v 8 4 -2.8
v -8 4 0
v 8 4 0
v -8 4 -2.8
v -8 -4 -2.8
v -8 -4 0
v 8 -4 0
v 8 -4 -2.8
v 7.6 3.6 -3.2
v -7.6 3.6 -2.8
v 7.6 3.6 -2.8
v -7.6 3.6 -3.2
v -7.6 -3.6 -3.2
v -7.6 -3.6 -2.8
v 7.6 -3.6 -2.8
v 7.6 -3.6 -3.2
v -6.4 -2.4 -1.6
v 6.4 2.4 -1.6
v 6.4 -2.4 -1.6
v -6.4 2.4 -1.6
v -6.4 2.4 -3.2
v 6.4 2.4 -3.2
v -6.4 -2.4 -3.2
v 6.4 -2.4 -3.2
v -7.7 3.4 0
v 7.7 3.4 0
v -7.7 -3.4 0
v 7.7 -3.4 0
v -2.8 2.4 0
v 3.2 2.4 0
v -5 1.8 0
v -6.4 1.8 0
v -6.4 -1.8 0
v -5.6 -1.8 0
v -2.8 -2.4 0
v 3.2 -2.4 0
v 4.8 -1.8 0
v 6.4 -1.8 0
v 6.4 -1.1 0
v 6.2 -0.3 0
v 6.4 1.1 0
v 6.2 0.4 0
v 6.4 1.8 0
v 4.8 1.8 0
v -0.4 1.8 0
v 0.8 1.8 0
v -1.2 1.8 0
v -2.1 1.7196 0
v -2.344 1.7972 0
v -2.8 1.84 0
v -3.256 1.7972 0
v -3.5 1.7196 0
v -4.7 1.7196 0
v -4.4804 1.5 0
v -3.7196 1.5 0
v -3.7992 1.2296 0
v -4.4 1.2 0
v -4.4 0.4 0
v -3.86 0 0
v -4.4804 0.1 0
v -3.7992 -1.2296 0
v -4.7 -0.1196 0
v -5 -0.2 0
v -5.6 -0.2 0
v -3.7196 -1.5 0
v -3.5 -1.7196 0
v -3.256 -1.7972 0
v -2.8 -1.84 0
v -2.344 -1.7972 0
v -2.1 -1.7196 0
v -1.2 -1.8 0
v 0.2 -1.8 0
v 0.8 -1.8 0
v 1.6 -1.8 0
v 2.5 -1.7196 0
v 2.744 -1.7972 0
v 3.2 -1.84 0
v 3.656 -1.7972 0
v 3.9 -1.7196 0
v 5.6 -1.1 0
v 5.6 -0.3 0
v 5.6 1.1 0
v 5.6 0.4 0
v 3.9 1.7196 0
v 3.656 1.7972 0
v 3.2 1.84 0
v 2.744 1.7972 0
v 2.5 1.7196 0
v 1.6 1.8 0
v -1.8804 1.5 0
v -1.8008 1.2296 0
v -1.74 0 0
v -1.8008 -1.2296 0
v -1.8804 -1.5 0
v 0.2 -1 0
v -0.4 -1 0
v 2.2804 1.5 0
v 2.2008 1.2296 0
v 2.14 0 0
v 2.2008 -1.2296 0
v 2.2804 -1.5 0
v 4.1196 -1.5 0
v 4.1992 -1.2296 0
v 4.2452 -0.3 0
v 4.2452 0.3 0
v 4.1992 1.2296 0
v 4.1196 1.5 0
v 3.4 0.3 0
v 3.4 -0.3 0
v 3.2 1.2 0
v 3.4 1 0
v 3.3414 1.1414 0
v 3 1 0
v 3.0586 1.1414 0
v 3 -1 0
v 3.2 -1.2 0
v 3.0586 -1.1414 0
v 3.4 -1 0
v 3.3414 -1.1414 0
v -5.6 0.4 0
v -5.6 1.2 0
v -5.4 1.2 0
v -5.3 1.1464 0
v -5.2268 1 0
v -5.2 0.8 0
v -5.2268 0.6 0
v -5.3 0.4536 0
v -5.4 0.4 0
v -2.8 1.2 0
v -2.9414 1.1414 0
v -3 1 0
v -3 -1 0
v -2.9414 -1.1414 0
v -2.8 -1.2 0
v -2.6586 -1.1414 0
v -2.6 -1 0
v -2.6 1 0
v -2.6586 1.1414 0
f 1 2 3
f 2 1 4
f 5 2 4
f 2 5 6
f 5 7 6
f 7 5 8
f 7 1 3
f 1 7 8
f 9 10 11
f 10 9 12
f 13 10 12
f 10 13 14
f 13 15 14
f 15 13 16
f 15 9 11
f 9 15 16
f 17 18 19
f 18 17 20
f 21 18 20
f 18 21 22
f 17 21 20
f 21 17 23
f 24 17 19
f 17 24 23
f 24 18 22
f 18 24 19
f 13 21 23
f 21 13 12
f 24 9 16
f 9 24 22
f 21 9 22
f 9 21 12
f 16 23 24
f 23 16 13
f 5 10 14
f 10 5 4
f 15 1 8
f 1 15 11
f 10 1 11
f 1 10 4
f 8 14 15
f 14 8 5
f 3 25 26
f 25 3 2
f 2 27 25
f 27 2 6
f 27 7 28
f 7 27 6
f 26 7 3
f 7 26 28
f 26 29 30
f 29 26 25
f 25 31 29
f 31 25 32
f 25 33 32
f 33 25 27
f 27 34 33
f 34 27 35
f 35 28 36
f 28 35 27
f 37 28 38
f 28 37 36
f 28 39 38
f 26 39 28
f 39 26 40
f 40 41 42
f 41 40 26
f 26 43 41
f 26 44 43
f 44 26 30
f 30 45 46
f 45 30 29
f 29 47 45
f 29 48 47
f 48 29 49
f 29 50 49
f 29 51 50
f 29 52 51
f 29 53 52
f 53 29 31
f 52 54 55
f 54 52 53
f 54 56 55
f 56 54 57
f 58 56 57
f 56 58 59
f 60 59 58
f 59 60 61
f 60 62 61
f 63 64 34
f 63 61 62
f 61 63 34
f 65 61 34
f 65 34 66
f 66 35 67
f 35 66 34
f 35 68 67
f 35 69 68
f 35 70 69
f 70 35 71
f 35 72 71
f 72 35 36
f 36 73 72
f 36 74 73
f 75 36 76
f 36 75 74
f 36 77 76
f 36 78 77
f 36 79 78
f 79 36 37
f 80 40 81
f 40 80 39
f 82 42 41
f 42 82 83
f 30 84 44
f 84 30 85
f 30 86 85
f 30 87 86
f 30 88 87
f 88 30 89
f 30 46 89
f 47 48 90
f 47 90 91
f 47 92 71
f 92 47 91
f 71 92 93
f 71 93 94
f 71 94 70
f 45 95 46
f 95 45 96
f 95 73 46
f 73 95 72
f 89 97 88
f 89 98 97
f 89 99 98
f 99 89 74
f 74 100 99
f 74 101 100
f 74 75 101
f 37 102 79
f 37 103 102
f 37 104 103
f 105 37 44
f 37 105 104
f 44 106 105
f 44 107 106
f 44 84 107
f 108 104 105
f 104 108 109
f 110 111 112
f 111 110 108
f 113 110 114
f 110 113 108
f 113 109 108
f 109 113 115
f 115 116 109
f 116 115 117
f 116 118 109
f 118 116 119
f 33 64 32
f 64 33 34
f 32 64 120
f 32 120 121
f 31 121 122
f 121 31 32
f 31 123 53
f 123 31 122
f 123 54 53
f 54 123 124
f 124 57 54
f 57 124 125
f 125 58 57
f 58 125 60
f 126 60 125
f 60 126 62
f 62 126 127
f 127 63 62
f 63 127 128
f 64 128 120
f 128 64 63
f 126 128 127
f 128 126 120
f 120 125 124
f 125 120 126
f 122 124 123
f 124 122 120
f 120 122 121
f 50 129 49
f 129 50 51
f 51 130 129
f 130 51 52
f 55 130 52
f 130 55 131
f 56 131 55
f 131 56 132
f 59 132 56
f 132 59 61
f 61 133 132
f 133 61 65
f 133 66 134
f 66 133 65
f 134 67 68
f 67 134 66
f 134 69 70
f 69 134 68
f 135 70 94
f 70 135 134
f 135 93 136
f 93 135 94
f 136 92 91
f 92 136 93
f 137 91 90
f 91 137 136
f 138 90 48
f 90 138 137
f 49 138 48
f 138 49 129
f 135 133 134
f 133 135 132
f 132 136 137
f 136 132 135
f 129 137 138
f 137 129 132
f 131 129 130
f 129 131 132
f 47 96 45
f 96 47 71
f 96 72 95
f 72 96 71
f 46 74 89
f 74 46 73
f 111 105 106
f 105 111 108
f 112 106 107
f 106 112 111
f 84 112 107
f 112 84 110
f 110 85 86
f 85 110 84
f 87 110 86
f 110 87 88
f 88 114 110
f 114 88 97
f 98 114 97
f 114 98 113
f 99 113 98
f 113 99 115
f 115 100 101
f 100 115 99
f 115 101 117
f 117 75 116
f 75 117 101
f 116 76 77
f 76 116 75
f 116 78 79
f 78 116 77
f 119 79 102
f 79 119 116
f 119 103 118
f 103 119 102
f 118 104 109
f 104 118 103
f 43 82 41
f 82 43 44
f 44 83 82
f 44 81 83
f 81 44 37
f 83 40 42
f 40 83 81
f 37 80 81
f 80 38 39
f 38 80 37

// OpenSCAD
// file: ../p/box5.scad
use <../lib.scad>
function ldraw_lib__box5() = [
// 0 Box with 5 Faces and All Edges
// 0 Name: box5.dat
// 0 Author: James Jessiman
// 0 !LDRAW_ORG Primitive UPDATE 2012-01
// 0 !LICENSE Licensed under CC BY 4.0 : see CAreadme.txt
// 
// 0 BFC CERTIFY CCW
  [0,"BFC","CERTIFY"],
  [0,"BFC","CCW"],
// 
// 0 !HISTORY 2002-04-03 [sbliss] Modified for BFC compliance
// 0 !HISTORY 2002-04-25 [PTadmin] Official Update 2002-02
// 0 !HISTORY 2007-06-24 [PTadmin] Header formatted for Contributor Agreement
// 0 !HISTORY 2008-07-01 [PTadmin] Official Update 2008-01
// 0 !HISTORY 2012-02-16 [Philo] Changed to CCW
// 0 !HISTORY 2012-03-30 [PTadmin] Official Update 2012-01
// 
// 
// 2 24 1 1 1 -1 1 1
  [2,24,1,1,1,-1,1,1],
// 2 24 -1 1 1 -1 1 -1
  [2,24,-1,1,1,-1,1,-1],
// 2 24 -1 1 -1 1 1 -1
  [2,24,-1,1,-1,1,1,-1],
// 2 24 1 1 -1 1 1 1
  [2,24,1,1,-1,1,1,1],
// 2 24 1 0 1 -1 0 1
  [2,24,1,0,1,-1,0,1],
// 2 24 -1 0 1 -1 0 -1
  [2,24,-1,0,1,-1,0,-1],
// 2 24 -1 0 -1 1 0 -1
  [2,24,-1,0,-1,1,0,-1],
// 2 24 1 0 -1 1 0 1
  [2,24,1,0,-1,1,0,1],
// 2 24 1 0 1 1 1 1
  [2,24,1,0,1,1,1,1],
// 2 24 -1 0 1 -1 1 1
  [2,24,-1,0,1,-1,1,1],
// 2 24 1 0 -1 1 1 -1
  [2,24,1,0,-1,1,1,-1],
// 2 24 -1 0 -1 -1 1 -1
  [2,24,-1,0,-1,-1,1,-1],
// 4 16 -1 1 1 1 1 1 1 1 -1 -1 1 -1
  [4,16,-1,1,1,1,1,1,1,1,-1,-1,1,-1],
// 4 16 -1 1 1 -1 0 1 1 0 1 1 1 1
  [4,16,-1,1,1,-1,0,1,1,0,1,1,1,1],
// 4 16 -1 1 -1 -1 0 -1 -1 0 1 -1 1 1
  [4,16,-1,1,-1,-1,0,-1,-1,0,1,-1,1,1],
// 4 16 1 1 -1 1 0 -1 -1 0 -1 -1 1 -1
  [4,16,1,1,-1,1,0,-1,-1,0,-1,-1,1,-1],
// 4 16 1 1 1 1 0 1 1 0 -1 1 1 -1
  [4,16,1,1,1,1,0,1,1,0,-1,1,1,-1],
];
module ldraw_lib__box5(step=0, col=false, unit=2/5, alt=false, line=0.2, solid=!$preview)
    makepoly(ldraw_lib__box5(), step=step, col=col, unit=unit, alt=alt, line=line, solid=solid);
ldraw_lib__box5(line=0.2);
// file: ../p/box4.scad
use <../lib.scad>
function ldraw_lib__box4() = [
// 0 Box with 4 Faces (2 Parallel Pairs) and All Edges
// 0 Name: box4.dat
// 0 Author: James Jessiman
// 0 !LDRAW_ORG Primitive UPDATE 2012-01
// 0 !LICENSE Licensed under CC BY 4.0 : see CAreadme.txt
// 
// 0 BFC CERTIFY CCW
  [0,"BFC","CERTIFY"],
  [0,"BFC","CCW"],
// 
// 0 !HISTORY 2002-04-03 [sbliss] Modified for BFC compliance
// 0 !HISTORY 2002-04-25 [PTadmin] Official Update 2002-02
// 0 !HISTORY 2007-06-24 [PTadmin] Header formatted for Contributor Agreement
// 0 !HISTORY 2008-07-01 [PTadmin] Official Update 2008-01
// 0 !HISTORY 2012-02-16 [Philo] Changed to CCW
// 0 !HISTORY 2012-03-30 [PTadmin] Official Update 2012-01
// 
// 
// 2 24 1 1 1 -1 1 1
  [2,24,1,1,1,-1,1,1],
// 2 24 -1 1 1 -1 1 -1
  [2,24,-1,1,1,-1,1,-1],
// 2 24 -1 1 -1 1 1 -1
  [2,24,-1,1,-1,1,1,-1],
// 2 24 1 1 -1 1 1 1
  [2,24,1,1,-1,1,1,1],
// 2 24 1 0 1 -1 0 1
  [2,24,1,0,1,-1,0,1],
// 2 24 -1 0 1 -1 0 -1
  [2,24,-1,0,1,-1,0,-1],
// 2 24 -1 0 -1 1 0 -1
  [2,24,-1,0,-1,1,0,-1],
// 2 24 1 0 -1 1 0 1
  [2,24,1,0,-1,1,0,1],
// 2 24 1 0 1 1 1 1
  [2,24,1,0,1,1,1,1],
// 2 24 -1 0 1 -1 1 1
  [2,24,-1,0,1,-1,1,1],
// 2 24 1 0 -1 1 1 -1
  [2,24,1,0,-1,1,1,-1],
// 2 24 -1 0 -1 -1 1 -1
  [2,24,-1,0,-1,-1,1,-1],
// 4 16 -1 1 1 -1 0 1 1 0 1 1 1 1
  [4,16,-1,1,1,-1,0,1,1,0,1,1,1,1],
// 4 16 -1 1 -1 -1 0 -1 -1 0 1 -1 1 1
  [4,16,-1,1,-1,-1,0,-1,-1,0,1,-1,1,1],
// 4 16 1 1 -1 1 0 -1 -1 0 -1 -1 1 -1
  [4,16,1,1,-1,1,0,-1,-1,0,-1,-1,1,-1],
// 4 16 1 1 1 1 0 1 1 0 -1 1 1 -1
  [4,16,1,1,1,1,0,1,1,0,-1,1,1,-1],
];
module ldraw_lib__box4(step=0, col=false, unit=2/5, alt=false, line=0.2, solid=!$preview)
    makepoly(ldraw_lib__box4(), step=step, col=col, unit=unit, alt=alt, line=line, solid=solid);
ldraw_lib__box4(line=0.2);
// file: s/3069bs01.scad
use <../../lib.scad>
use <../../p/box4.scad>
use <../../p/box5.scad>
function ldraw_lib__s__3069bs01() = [
// 0 ~Tile  1 x  2 with Groove without Top Face
// 0 Name: s\3069bs01.dat
// 0 Author: Santeri Piippo [arezey]
// 0 !LDRAW_ORG Subpart UPDATE 2010-02
// 0 !LICENSE Licensed under CC BY 4.0 : see CAreadme.txt
// 
// 0 BFC CERTIFY CCW
  [0,"BFC","CERTIFY"],
  [0,"BFC","CCW"],
// 
// 0 !HISTORY 2010-07-05 [PTadmin] Official Update 2010-02
// 
// 
// 1 16 0 0 0 20 0 0 0 7 0 0 0 10 box4.dat
  [1,16,0,0,0,20,0,0,0,7,0,0,0,10, ldraw_lib__box4()],
// 1 16 0 7 0 19 0 0 0 1 0 0 0 9 box4.dat
  [1,16,0,7,0,19,0,0,0,1,0,0,0,9, ldraw_lib__box4()],
// 0 BFC INVERTNEXT
  [0,"BFC","INVERTNEXT"],
// 1 16 0 8 0 16 0 0 0 -4 0 0 0 6 box5.dat
  [1,16,0,8,0,16,0,0,0,-4,0,0,0,6, ldraw_lib__box5()],
// 4 16 -19 8 9 -16 8 6 -16 8 -6 -19 8 -9
  [4,16,-19,8,9,-16,8,6,-16,8,-6,-19,8,-9],
// 4 16 19 8 -9 16 8 -6 16 8 6 19 8 9
  [4,16,19,8,-9,16,8,-6,16,8,6,19,8,9],
// 4 16 19 8 9 16 8 6 -16 8 6 -19 8 9
  [4,16,19,8,9,16,8,6,-16,8,6,-19,8,9],
// 4 16 -19 8 -9 -16 8 -6 16 8 -6 19 8 -9
  [4,16,-19,8,-9,-16,8,-6,16,8,-6,19,8,-9],
// 4 16 -20 7 10 -19 7 9 -19 7 -9 -20 7 -10
  [4,16,-20,7,10,-19,7,9,-19,7,-9,-20,7,-10],
// 4 16 20 7 -10 19 7 -9 19 7 9 20 7 10
  [4,16,20,7,-10,19,7,-9,19,7,9,20,7,10],
// 4 16 20 7 10 19 7 9 -19 7 9 -20 7 10
  [4,16,20,7,10,19,7,9,-19,7,9,-20,7,10],
// 4 16 -20 7 -10 -19 7 -9 19 7 -9 20 7 -10
  [4,16,-20,7,-10,-19,7,-9,19,7,-9,20,7,-10],
// 0 //
];
module ldraw_lib__s__3069bs01(step=0, col=false, unit=2/5, alt=false, line=0.2, solid=!$preview)
    makepoly(ldraw_lib__s__3069bs01(), step=step, col=col, unit=unit, alt=alt, line=line, solid=solid);
ldraw_lib__s__3069bs01(line=0.2);
// main file
use <../lib.scad>
use <s/3069bs01.scad>
function ldraw_lib__3069bp17() = [
// 0 Tile  1 x  2 with White "POLICE" on Blue Background Pattern
// 0 Name: 3069bp17.dat
// 0 Author: Massimo Maso [Sirio]
// 0 !LDRAW_ORG Part UPDATE 2015-02
// 0 !LICENSE Licensed under CC BY 4.0 : see CAreadme.txt
// 
// 0 BFC CERTIFY CCW
  [0,"BFC","CERTIFY"],
  [0,"BFC","CCW"],
// 
// 0 !HISTORY 2015-12-30 [PTadmin] Official Update 2015-02
// 
// 
// 1 16 0 0 0 1 0 0 0 1 0 0 0 1 s\3069bs01.dat
  [1,16,0,0,0,1,0,0,0,1,0,0,0,1, ldraw_lib__s__3069bs01()],
// 0 // Frame
// 4 16 -19.25 0 8.5 19.25 0 8.5 20 0 10 -20 0 10
  [4,16,-19.25,0,8.5,19.25,0,8.5,20,0,10,-20,0,10],
// 4 16 -19.25 0 8.5 -20 0 10 -20 0 -10 -19.25 0 -8.5
  [4,16,-19.25,0,8.5,-20,0,10,-20,0,-10,-19.25,0,-8.5],
// 4 16 -20 0 -10 20 0 -10 19.25 0 -8.5 -19.25 0 -8.5
  [4,16,-20,0,-10,20,0,-10,19.25,0,-8.5,-19.25,0,-8.5],
// 4 16 19.25 0 -8.5 20 0 -10 20 0 10 19.25 0 8.5
  [4,16,19.25,0,-8.5,20,0,-10,20,0,10,19.25,0,8.5],
// 0 // Blue border
// 4 1 -19.25 0 8.5 -7 0 6 8 0 6 19.25 0 8.5
  [4,1,-19.25,0,8.5,-7,0,6,8,0,6,19.25,0,8.5],
// 4 1 -19.25 0 8.5 -16 0 4.5 -12.5 0 4.5 -7 0 6
  [4,1,-19.25,0,8.5,-16,0,4.5,-12.5,0,4.5,-7,0,6],
// 4 1 -19.25 0 8.5 -19.25 0 -8.5 -16 0 -4.5 -16 0 4.5
  [4,1,-19.25,0,8.5,-19.25,0,-8.5,-16,0,-4.5,-16,0,4.5],
// 4 1 -19.25 0 -8.5 -7 0 -6 -14 0 -4.5 -16 0 -4.5
  [4,1,-19.25,0,-8.5,-7,0,-6,-14,0,-4.5,-16,0,-4.5],
// 4 1 -19.25 0 -8.5 19.25 0 -8.5 8 0 -6 -7 0 -6
  [4,1,-19.25,0,-8.5,19.25,0,-8.5,8,0,-6,-7,0,-6],
// 4 1 19.25 0 -8.5 16 0 -4.5 12 0 -4.5 8 0 -6
  [4,1,19.25,0,-8.5,16,0,-4.5,12,0,-4.5,8,0,-6],
// 3 1 19.25 0 -8.5 16 0 -2.75 16 0 -4.5
  [3,1,19.25,0,-8.5,16,0,-2.75,16,0,-4.5],
// 4 1 19.25 0 8.5 15.5 0 -0.75 16 0 -2.75 19.25 0 -8.5
  [4,1,19.25,0,8.5,15.5,0,-0.75,16,0,-2.75,19.25,0,-8.5],
// 4 1 19.25 0 8.5 16 0 2.75 15.5 0 1 15.5 0 -0.75
  [4,1,19.25,0,8.5,16,0,2.75,15.5,0,1,15.5,0,-0.75],
// 3 1 19.25 0 8.5 16 0 4.5 16 0 2.75
  [3,1,19.25,0,8.5,16,0,4.5,16,0,2.75],
// 4 1 19.25 0 8.5 8 0 6 12 0 4.5 16 0 4.5
  [4,1,19.25,0,8.5,8,0,6,12,0,4.5,16,0,4.5],
// 4 1 -7 0 6 -1 0 4.5 2 0 4.5 8 0 6
  [4,1,-7,0,6,-1,0,4.5,2,0,4.5,8,0,6],
// 3 1 -7 0 6 -3 0 4.5 -1 0 4.5
  [3,1,-7,0,6,-3,0,4.5,-1,0,4.5],
// 4 1 -7 0 6 -5.86 0 4.493 -5.25 0 4.299 -3 0 4.5
  [4,1,-7,0,6,-5.86,0,4.493,-5.25,0,4.299,-3,0,4.5],
// 3 1 -7 0 6 -7 0 4.6 -5.86 0 4.493
  [3,1,-7,0,6,-7,0,4.6,-5.86,0,4.493],
// 3 1 -7 0 6 -8.14 0 4.493 -7 0 4.6
  [3,1,-7,0,6,-8.14,0,4.493,-7,0,4.6],
// 3 1 -7 0 6 -8.75 0 4.299 -8.14 0 4.493
  [3,1,-7,0,6,-8.75,0,4.299,-8.14,0,4.493],
// 4 1 -7 0 6 -12.5 0 4.5 -11.75 0 4.299 -8.75 0 4.299
  [4,1,-7,0,6,-12.5,0,4.5,-11.75,0,4.299,-8.75,0,4.299],
// 4 1 -11.75 0 4.299 -11.201 0 3.75 -9.299 0 3.75 -8.75 0 4.299
  [4,1,-11.75,0,4.299,-11.201,0,3.75,-9.299,0,3.75,-8.75,0,4.299],
// 4 1 -11 0 3 -9.4981 0 3.074 -9.299 0 3.75 -11.201 0 3.75
  [4,1,-11,0,3,-9.4981,0,3.074,-9.299,0,3.75,-11.201,0,3.75],
// 4 1 -9.65 0 0 -9.4981 0 3.074 -11 0 3 -11 0 1
  [4,1,-9.65,0,0,-9.4981,0,3.074,-11,0,3,-11,0,1],
// 4 1 -11 0 1 -11.201 0 0.25 -9.4981 0 -3.074 -9.65 0 0
  [4,1,-11,0,1,-11.201,0,0.25,-9.4981,0,-3.074,-9.65,0,0],
// 3 1 -11.201 0 0.25 -11.75 0 -0.299 -9.4981 0 -3.074
  [3,1,-11.201,0,0.25,-11.75,0,-0.299,-9.4981,0,-3.074],
// 3 1 -12.5 0 -0.5 -14 0 -0.5 -14 0 -4.5
  [3,1,-12.5,0,-0.5,-14,0,-0.5,-14,0,-4.5],
// 4 1 -12.5 0 -0.5 -14 0 -4.5 -9.4981 0 -3.074 -11.75 0 -0.299
  [4,1,-12.5,0,-0.5,-14,0,-4.5,-9.4981,0,-3.074,-11.75,0,-0.299],
// 3 1 -9.299 0 -3.75 -9.4981 0 -3.074 -14 0 -4.5
  [3,1,-9.299,0,-3.75,-9.4981,0,-3.074,-14,0,-4.5],
// 3 1 -9.299 0 -3.75 -14 0 -4.5 -8.75 0 -4.299
  [3,1,-9.299,0,-3.75,-14,0,-4.5,-8.75,0,-4.299],
// 4 1 -7 0 -6 -8.14 0 -4.493 -8.75 0 -4.299 -14 0 -4.5
  [4,1,-7,0,-6,-8.14,0,-4.493,-8.75,0,-4.299,-14,0,-4.5],
// 3 1 -7 0 -6 -7 0 -4.6 -8.14 0 -4.493
  [3,1,-7,0,-6,-7,0,-4.6,-8.14,0,-4.493],
// 3 1 -7 0 -6 -5.86 0 -4.493 -7 0 -4.6
  [3,1,-7,0,-6,-5.86,0,-4.493,-7,0,-4.6],
// 4 1 -7 0 -6 -3 0 -4.5 -5.25 0 -4.299 -5.86 0 -4.493
  [4,1,-7,0,-6,-3,0,-4.5,-5.25,0,-4.299,-5.86,0,-4.493],
// 4 1 -7 0 -6 8 0 -6 0.5 0 -4.5 -3 0 -4.5
  [4,1,-7,0,-6,8,0,-6,0.5,0,-4.5,-3,0,-4.5],
// 3 1 8 0 -6 2 0 -4.5 0.5 0 -4.5
  [3,1,8,0,-6,2,0,-4.5,0.5,0,-4.5],
// 3 1 8 0 -6 4 0 -4.5 2 0 -4.5
  [3,1,8,0,-6,4,0,-4.5,2,0,-4.5],
// 4 1 8 0 -6 6.86 0 -4.493 6.25 0 -4.299 4 0 -4.5
  [4,1,8,0,-6,6.86,0,-4.493,6.25,0,-4.299,4,0,-4.5],
// 3 1 8 0 -6 8 0 -4.6 6.86 0 -4.493
  [3,1,8,0,-6,8,0,-4.6,6.86,0,-4.493],
// 3 1 8 0 -6 9.14 0 -4.493 8 0 -4.6
  [3,1,8,0,-6,9.14,0,-4.493,8,0,-4.6],
// 4 1 8 0 -6 12 0 -4.5 9.75 0 -4.299 9.14 0 -4.493
  [4,1,8,0,-6,12,0,-4.5,9.75,0,-4.299,9.14,0,-4.493],
// 4 1 14 0 -2.75 16 0 -2.75 15.5 0 -0.75 14 0 -0.75
  [4,1,14,0,-2.75,16,0,-2.75,15.5,0,-0.75,14,0,-0.75],
// 4 1 15.5 0 1 16 0 2.75 14 0 2.75 14 0 1
  [4,1,15.5,0,1,16,0,2.75,14,0,2.75,14,0,1],
// 4 1 8 0 6 9.14 0 4.493 9.75 0 4.299 12 0 4.5
  [4,1,8,0,6,9.14,0,4.493,9.75,0,4.299,12,0,4.5],
// 3 1 8 0 6 8 0 4.6 9.14 0 4.493
  [3,1,8,0,6,8,0,4.6,9.14,0,4.493],
// 3 1 8 0 6 6.86 0 4.493 8 0 4.6
  [3,1,8,0,6,6.86,0,4.493,8,0,4.6],
// 4 1 8 0 6 4 0 4.5 6.25 0 4.299 6.86 0 4.493
  [4,1,8,0,6,4,0,4.5,6.25,0,4.299,6.86,0,4.493],
// 3 1 8 0 6 2 0 4.5 4 0 4.5
  [3,1,8,0,6,2,0,4.5,4,0,4.5],
// 3 1 -3 0 4.5 -5.25 0 4.299 -4.701 0 3.75
  [3,1,-3,0,4.5,-5.25,0,4.299,-4.701,0,3.75],
// 3 1 -3 0 4.5 -4.701 0 3.75 -4.5019 0 3.074
  [3,1,-3,0,4.5,-4.701,0,3.75,-4.5019,0,3.074],
// 4 1 -3 0 -4.5 -3 0 4.5 -4.5019 0 3.074 -4.35 0 0
  [4,1,-3,0,-4.5,-3,0,4.5,-4.5019,0,3.074,-4.35,0,0],
// 3 1 -3 0 -4.5 -4.35 0 0 -4.5019 0 -3.074
  [3,1,-3,0,-4.5,-4.35,0,0,-4.5019,0,-3.074],
// 3 1 -3 0 -4.5 -4.5019 0 -3.074 -4.701 0 -3.75
  [3,1,-3,0,-4.5,-4.5019,0,-3.074,-4.701,0,-3.75],
// 3 1 -3 0 -4.5 -4.701 0 -3.75 -5.25 0 -4.299
  [3,1,-3,0,-4.5,-4.701,0,-3.75,-5.25,0,-4.299],
// 4 1 2 0 4.5 -1 0 4.5 -1 0 -2.5 0.5 0 -2.5
  [4,1,2,0,4.5,-1,0,4.5,-1,0,-2.5,0.5,0,-2.5],
// 4 1 2 0 4.5 0.5 0 -2.5 0.5 0 -4.5 2 0 -4.5
  [4,1,2,0,4.5,0.5,0,-2.5,0.5,0,-4.5,2,0,-4.5],
// 3 1 4 0 4.5 5.701 0 3.75 6.25 0 4.299
  [3,1,4,0,4.5,5.701,0,3.75,6.25,0,4.299],
// 3 1 4 0 4.5 5.5019 0 3.074 5.701 0 3.75
  [3,1,4,0,4.5,5.5019,0,3.074,5.701,0,3.75],
// 4 1 4 0 4.5 4 0 -4.5 5.35 0 0 5.5019 0 3.074
  [4,1,4,0,4.5,4,0,-4.5,5.35,0,0,5.5019,0,3.074],
// 3 1 4 0 -4.5 5.5019 0 -3.074 5.35 0 0
  [3,1,4,0,-4.5,5.5019,0,-3.074,5.35,0,0],
// 3 1 4 0 -4.5 5.701 0 -3.75 5.5019 0 -3.074
  [3,1,4,0,-4.5,5.701,0,-3.75,5.5019,0,-3.074],
// 3 1 4 0 -4.5 6.25 0 -4.299 5.701 0 -3.75
  [3,1,4,0,-4.5,6.25,0,-4.299,5.701,0,-3.75],
// 3 1 12 0 -4.5 10.299 0 -3.75 9.75 0 -4.299
  [3,1,12,0,-4.5,10.299,0,-3.75,9.75,0,-4.299],
// 3 1 12 0 -4.5 10.4981 0 -3.074 10.299 0 -3.75
  [3,1,12,0,-4.5,10.4981,0,-3.074,10.299,0,-3.75],
// 3 1 12 0 -4.5 10.613 0 -0.75 10.4981 0 -3.074
  [3,1,12,0,-4.5,10.613,0,-0.75,10.4981,0,-3.074],
// 4 1 12 0 4.5 10.613 0 0.75 10.613 0 -0.75 12 0 -4.5
  [4,1,12,0,4.5,10.613,0,0.75,10.613,0,-0.75,12,0,-4.5],
// 3 1 12 0 4.5 10.4981 0 3.074 10.613 0 0.75
  [3,1,12,0,4.5,10.4981,0,3.074,10.613,0,0.75],
// 3 1 12 0 4.5 10.299 0 3.75 10.4981 0 3.074
  [3,1,12,0,4.5,10.299,0,3.75,10.4981,0,3.074],
// 3 1 12 0 4.5 9.75 0 4.299 10.299 0 3.75
  [3,1,12,0,4.5,9.75,0,4.299,10.299,0,3.75],
// 4 1 8.5 0 0.75 8.5 0 -0.75 10.613 0 -0.75 10.613 0 0.75
  [4,1,8.5,0,0.75,8.5,0,-0.75,10.613,0,-0.75,10.613,0,0.75],
// 4 1 8.5 0 0.75 8.5 0 2.5 8.3536 0 2.8536 8 0 3
  [4,1,8.5,0,0.75,8.5,0,2.5,8.3536,0,2.8536,8,0,3],
// 4 1 8.5 0 0.75 8 0 3 7.6464 0 2.8536 7.5 0 2.5
  [4,1,8.5,0,0.75,8,0,3,7.6464,0,2.8536,7.5,0,2.5],
// 4 1 8.5 0 0.75 7.5 0 2.5 7.5 0 -2.5 8.5 0 -0.75
  [4,1,8.5,0,0.75,7.5,0,2.5,7.5,0,-2.5,8.5,0,-0.75],
// 4 1 8.5 0 -0.75 7.5 0 -2.5 7.6464 0 -2.8536 8 0 -3
  [4,1,8.5,0,-0.75,7.5,0,-2.5,7.6464,0,-2.8536,8,0,-3],
// 4 1 8.5 0 -0.75 8 0 -3 8.3536 0 -2.8536 8.5 0 -2.5
  [4,1,8.5,0,-0.75,8,0,-3,8.3536,0,-2.8536,8.5,0,-2.5],
// 0 // Script
// 0 // Letter "P"
// 4 15 -16 0 4.5 -16 0 -4.5 -14 0 -4.5 -14 0 -0.5
  [4,15,-16,0,4.5,-16,0,-4.5,-14,0,-4.5,-14,0,-0.5],
// 3 15 -16 0 4.5 -14 0 -0.5 -14 0 1
  [3,15,-16,0,4.5,-14,0,-0.5,-14,0,1],
// 3 15 -16 0 4.5 -14 0 1 -14 0 3
  [3,15,-16,0,4.5,-14,0,1,-14,0,3],
// 4 15 -12.5 0 4.5 -16 0 4.5 -14 0 3 -13.5 0 3
  [4,15,-12.5,0,4.5,-16,0,4.5,-14,0,3,-13.5,0,3],
// 4 15 -12.5 0 4.5 -13.5 0 3 -13.25 0 2.86603 -11.75 0 4.299
  [4,15,-12.5,0,4.5,-13.5,0,3,-13.25,0,2.86603,-11.75,0,4.299],
// 4 15 -11.201 0 3.75 -11.75 0 4.299 -13.25 0 2.86603 -13.067 0 2.5
  [4,15,-11.201,0,3.75,-11.75,0,4.299,-13.25,0,2.86603,-13.067,0,2.5],
// 4 15 -11.201 0 3.75 -13.067 0 2.5 -13 0 2 -11 0 3
  [4,15,-11.201,0,3.75,-13.067,0,2.5,-13,0,2,-11,0,3],
// 4 15 -11.201 0 0.25 -11 0 1 -11 0 3 -13 0 2
  [4,15,-11.201,0,0.25,-11,0,1,-11,0,3,-13,0,2],
// 4 15 -11.201 0 0.25 -13 0 2 -13.067 0 1.5 -11.75 0 -0.299
  [4,15,-11.201,0,0.25,-13,0,2,-13.067,0,1.5,-11.75,0,-0.299],
// 3 15 -11.75 0 -0.299 -13.067 0 1.5 -13.25 0 1.13397
  [3,15,-11.75,0,-0.299,-13.067,0,1.5,-13.25,0,1.13397],
// 4 15 -11.75 0 -0.299 -13.25 0 1.134 -13.5 0 1 -12.5 0 -0.5
  [4,15,-11.75,0,-0.299,-13.25,0,1.134,-13.5,0,1,-12.5,0,-0.5],
// 4 15 -12.5 0 -0.5 -13.5 0 1 -14 0 1 -14 0 -0.5
  [4,15,-12.5,0,-0.5,-13.5,0,1,-14,0,1,-14,0,-0.5],
// 0 // Inside letter "P"
// 4 1 -14 0 1 -13.5 0 1 -13.25 0 1.134 -13.067 0 1.5
  [4,1,-14,0,1,-13.5,0,1,-13.25,0,1.134,-13.067,0,1.5],
// 4 1 -14 0 1 -13.067 0 1.5 -13 0 2 -13.067 0 2.5
  [4,1,-14,0,1,-13.067,0,1.5,-13,0,2,-13.067,0,2.5],
// 4 1 -14 0 1 -13.067 0 2.5 -13.25 0 2.86603 -13.5 0 3
  [4,1,-14,0,1,-13.067,0,2.5,-13.25,0,2.86603,-13.5,0,3],
// 3 1 -14 0 1 -13.5 0 3 -14 0 3
  [3,1,-14,0,1,-13.5,0,3,-14,0,3],
// 0 // Letter "O"
// 4 15 -7 0 3 -5.86 0 4.493 -7 0 4.6 -8.14 0 4.493
  [4,15,-7,0,3,-5.86,0,4.493,-7,0,4.6,-8.14,0,4.493],
// 4 15 -7 0 3 -8.14 0 4.493 -8.75 0 4.299 -7.3536 0 2.8536
  [4,15,-7,0,3,-8.14,0,4.493,-8.75,0,4.299,-7.3536,0,2.8536],
// 4 15 -7.5 0 2.5 -7.3536 0 2.8536 -8.75 0 4.299 -9.299 0 3.75
  [4,15,-7.5,0,2.5,-7.3536,0,2.8536,-8.75,0,4.299,-9.299,0,3.75],
// 4 15 -7.5 0 2.5 -9.299 0 3.75 -9.4981 0 3.074 -7.5 0 -2.5
  [4,15,-7.5,0,2.5,-9.299,0,3.75,-9.4981,0,3.074,-7.5,0,-2.5],
// 4 15 -7.5 0 -2.5 -9.4981 0 3.074 -9.65 0 0 -9.4981 0 -3.074
  [4,15,-7.5,0,-2.5,-9.4981,0,3.074,-9.65,0,0,-9.4981,0,-3.074],
// 4 15 -7.5 0 -2.5 -9.4981 0 -3.074 -9.299 0 -3.75 -7.3536 0 -2.8536
  [4,15,-7.5,0,-2.5,-9.4981,0,-3.074,-9.299,0,-3.75,-7.3536,0,-2.8536],
// 4 15 -7 0 -3 -7.3536 0 -2.8536 -9.299 0 -3.75 -8.75 0 -4.299
  [4,15,-7,0,-3,-7.3536,0,-2.8536,-9.299,0,-3.75,-8.75,0,-4.299],
// 4 15 -7 0 -3 -8.75 0 -4.299 -8.14 0 -4.493 -7 0 -4.6
  [4,15,-7,0,-3,-8.75,0,-4.299,-8.14,0,-4.493,-7,0,-4.6],
// 4 15 -7 0 -3 -7 0 -4.6 -5.86 0 -4.493 -5.25 0 -4.299
  [4,15,-7,0,-3,-7,0,-4.6,-5.86,0,-4.493,-5.25,0,-4.299],
// 4 15 -7 0 -3 -5.25 0 -4.299 -4.701 0 -3.75 -6.6464 0 -2.8536
  [4,15,-7,0,-3,-5.25,0,-4.299,-4.701,0,-3.75,-6.6464,0,-2.8536],
// 4 15 -4.5019 0 -3.074 -6.5 0 -2.5 -6.6464 0 -2.8536 -4.701 0 -3.75
  [4,15,-4.5019,0,-3.074,-6.5,0,-2.5,-6.6464,0,-2.8536,-4.701,0,-3.75],
// 4 15 -4.5019 0 -3.074 -4.35 0 0 -4.5019 0 3.074 -6.5 0 -2.5
  [4,15,-4.5019,0,-3.074,-4.35,0,0,-4.5019,0,3.074,-6.5,0,-2.5],
// 4 15 -4.5019 0 3.074 -4.701 0 3.75 -6.5 0 2.5 -6.5 0 -2.5
  [4,15,-4.5019,0,3.074,-4.701,0,3.75,-6.5,0,2.5,-6.5,0,-2.5],
// 4 15 -5.25 0 4.299 -6.6464 0 2.8536 -6.5 0 2.5 -4.701 0 3.75
  [4,15,-5.25,0,4.299,-6.6464,0,2.8536,-6.5,0,2.5,-4.701,0,3.75],
// 4 15 -5.25 0 4.299 -5.86 0 4.493 -7 0 3 -6.6464 0 2.8536
  [4,15,-5.25,0,4.299,-5.86,0,4.493,-7,0,3,-6.6464,0,2.8536],
// 0 // Inside letter "O"
// 4 1 -7.5 0 -2.5 -7.3536 0 -2.8536 -7 0 -3 -6.6464 0 -2.8536
  [4,1,-7.5,0,-2.5,-7.3536,0,-2.8536,-7,0,-3,-6.6464,0,-2.8536],
// 4 1 -7.5 0 -2.5 -6.6464 0 -2.8536 -6.5 0 -2.5 -6.5 0 2.5
  [4,1,-7.5,0,-2.5,-6.6464,0,-2.8536,-6.5,0,-2.5,-6.5,0,2.5],
// 4 1 -7.5 0 -2.5 -6.5 0 2.5 -6.6464 0 2.8536 -7 0 3
  [4,1,-7.5,0,-2.5,-6.5,0,2.5,-6.6464,0,2.8536,-7,0,3],
// 4 1 -7.5 0 -2.5 -7 0 3 -7.3536 0 2.8536 -7.5 0 2.5
  [4,1,-7.5,0,-2.5,-7,0,3,-7.3536,0,2.8536,-7.5,0,2.5],
// 0 // Letter "L"
// 4 15 -3 0 -4.5 -1 0 -2.5 -1 0 4.5 -3 0 4.5
  [4,15,-3,0,-4.5,-1,0,-2.5,-1,0,4.5,-3,0,4.5],
// 4 15 -3 0 -4.5 0.5 0 -4.5 0.5 0 -2.5 -1 0 -2.5
  [4,15,-3,0,-4.5,0.5,0,-4.5,0.5,0,-2.5,-1,0,-2.5],
// 0 // Letter "I"
// 4 15 2 0 4.5 2 0 -4.5 4 0 -4.5 4 0 4.5
  [4,15,2,0,4.5,2,0,-4.5,4,0,-4.5,4,0,4.5],
// 0 // Letter "C"
// 4 15 8.5 0 0.75 10.613 0 0.75 10.4981 0 3.074 8.5 0 2.5
  [4,15,8.5,0,0.75,10.613,0,0.75,10.4981,0,3.074,8.5,0,2.5],
// 4 15 8.5 0 2.5 10.4981 0 3.074 10.299 0 3.75 8.3536 0 2.8536
  [4,15,8.5,0,2.5,10.4981,0,3.074,10.299,0,3.75,8.3536,0,2.8536],
// 4 15 8 0 3 8.3536 0 2.8536 10.299 0 3.75 9.75 0 4.299
  [4,15,8,0,3,8.3536,0,2.8536,10.299,0,3.75,9.75,0,4.299],
// 4 15 8 0 3 9.75 0 4.299 9.14 0 4.493 8 0 4.6
  [4,15,8,0,3,9.75,0,4.299,9.14,0,4.493,8,0,4.6],
// 4 15 8 0 3 8 0 4.6 6.86 0 4.493 6.25 0 4.299
  [4,15,8,0,3,8,0,4.6,6.86,0,4.493,6.25,0,4.299],
// 4 15 8 0 3 6.25 0 4.299 5.701 0 3.75 7.6464 0 2.8536
  [4,15,8,0,3,6.25,0,4.299,5.701,0,3.75,7.6464,0,2.8536],
// 4 15 7.5 0 2.5 7.6464 0 2.8536 5.701 0 3.75 5.5019 0 3.074
  [4,15,7.5,0,2.5,7.6464,0,2.8536,5.701,0,3.75,5.5019,0,3.074],
// 4 15 7.5 0 -2.5 7.5 0 2.5 5.5019 0 3.074 5.35 0 0
  [4,15,7.5,0,-2.5,7.5,0,2.5,5.5019,0,3.074,5.35,0,0],
// 4 15 7.5 0 -2.5 5.35 0 0 5.5019 0 -3.074 5.701 0 -3.75
  [4,15,7.5,0,-2.5,5.35,0,0,5.5019,0,-3.074,5.701,0,-3.75],
// 3 15 7.5 0 -2.5 5.701 0 -3.75 7.6464 0 -2.8536
  [3,15,7.5,0,-2.5,5.701,0,-3.75,7.6464,0,-2.8536],
// 4 15 8 0 -3 7.6464 0 -2.8536 5.701 0 -3.75 6.25 0 -4.299
  [4,15,8,0,-3,7.6464,0,-2.8536,5.701,0,-3.75,6.25,0,-4.299],
// 4 15 8 0 -3 6.25 0 -4.299 6.86 0 -4.493 8 0 -4.6
  [4,15,8,0,-3,6.25,0,-4.299,6.86,0,-4.493,8,0,-4.6],
// 4 15 8 0 -3 8 0 -4.6 9.14 0 -4.493 9.75 0 -4.299
  [4,15,8,0,-3,8,0,-4.6,9.14,0,-4.493,9.75,0,-4.299],
// 4 15 8 0 -3 9.75 0 -4.299 10.299 0 -3.75 8.3536 0 -2.8536
  [4,15,8,0,-3,9.75,0,-4.299,10.299,0,-3.75,8.3536,0,-2.8536],
// 4 15 8.5 0 -2.5 8.3536 0 -2.8536 10.299 0 -3.75 10.4981 0 -3.074
  [4,15,8.5,0,-2.5,8.3536,0,-2.8536,10.299,0,-3.75,10.4981,0,-3.074],
// 4 15 8.5 0 -2.5 10.4981 0 -3.074 10.613 0 -0.75 8.5 0 -0.75
  [4,15,8.5,0,-2.5,10.4981,0,-3.074,10.613,0,-0.75,8.5,0,-0.75],
// 0 // Letter "E"
// 4 15 12 0 4.5 14 0 2.75 16 0 2.75 16 0 4.5
  [4,15,12,0,4.5,14,0,2.75,16,0,2.75,16,0,4.5],
// 3 15 12 0 4.5 14 0 1 14 0 2.75
  [3,15,12,0,4.5,14,0,1,14,0,2.75],
// 4 15 12 0 4.5 12 0 -4.5 14 0 -0.75 14 0 1
  [4,15,12,0,4.5,12,0,-4.5,14,0,-0.75,14,0,1],
// 4 15 14 0 -0.75 15.5 0 -0.75 15.5 0 1 14 0 1
  [4,15,14,0,-0.75,15.5,0,-0.75,15.5,0,1,14,0,1],
// 3 15 12 0 -4.5 14 0 -2.75 14 0 -0.75
  [3,15,12,0,-4.5,14,0,-2.75,14,0,-0.75],
// 4 15 12 0 -4.5 16 0 -4.5 16 0 -2.75 14 0 -2.75
  [4,15,12,0,-4.5,16,0,-4.5,16,0,-2.75,14,0,-2.75],
];
module ldraw_lib__3069bp17(step=0, col=false, unit=2/5, alt=false, line=0.2, solid=!$preview)
    makepoly(ldraw_lib__3069bp17(), step=step, col=col, unit=unit, alt=alt, line=line, solid=solid);
ldraw_lib__3069bp17(line=0.2);
